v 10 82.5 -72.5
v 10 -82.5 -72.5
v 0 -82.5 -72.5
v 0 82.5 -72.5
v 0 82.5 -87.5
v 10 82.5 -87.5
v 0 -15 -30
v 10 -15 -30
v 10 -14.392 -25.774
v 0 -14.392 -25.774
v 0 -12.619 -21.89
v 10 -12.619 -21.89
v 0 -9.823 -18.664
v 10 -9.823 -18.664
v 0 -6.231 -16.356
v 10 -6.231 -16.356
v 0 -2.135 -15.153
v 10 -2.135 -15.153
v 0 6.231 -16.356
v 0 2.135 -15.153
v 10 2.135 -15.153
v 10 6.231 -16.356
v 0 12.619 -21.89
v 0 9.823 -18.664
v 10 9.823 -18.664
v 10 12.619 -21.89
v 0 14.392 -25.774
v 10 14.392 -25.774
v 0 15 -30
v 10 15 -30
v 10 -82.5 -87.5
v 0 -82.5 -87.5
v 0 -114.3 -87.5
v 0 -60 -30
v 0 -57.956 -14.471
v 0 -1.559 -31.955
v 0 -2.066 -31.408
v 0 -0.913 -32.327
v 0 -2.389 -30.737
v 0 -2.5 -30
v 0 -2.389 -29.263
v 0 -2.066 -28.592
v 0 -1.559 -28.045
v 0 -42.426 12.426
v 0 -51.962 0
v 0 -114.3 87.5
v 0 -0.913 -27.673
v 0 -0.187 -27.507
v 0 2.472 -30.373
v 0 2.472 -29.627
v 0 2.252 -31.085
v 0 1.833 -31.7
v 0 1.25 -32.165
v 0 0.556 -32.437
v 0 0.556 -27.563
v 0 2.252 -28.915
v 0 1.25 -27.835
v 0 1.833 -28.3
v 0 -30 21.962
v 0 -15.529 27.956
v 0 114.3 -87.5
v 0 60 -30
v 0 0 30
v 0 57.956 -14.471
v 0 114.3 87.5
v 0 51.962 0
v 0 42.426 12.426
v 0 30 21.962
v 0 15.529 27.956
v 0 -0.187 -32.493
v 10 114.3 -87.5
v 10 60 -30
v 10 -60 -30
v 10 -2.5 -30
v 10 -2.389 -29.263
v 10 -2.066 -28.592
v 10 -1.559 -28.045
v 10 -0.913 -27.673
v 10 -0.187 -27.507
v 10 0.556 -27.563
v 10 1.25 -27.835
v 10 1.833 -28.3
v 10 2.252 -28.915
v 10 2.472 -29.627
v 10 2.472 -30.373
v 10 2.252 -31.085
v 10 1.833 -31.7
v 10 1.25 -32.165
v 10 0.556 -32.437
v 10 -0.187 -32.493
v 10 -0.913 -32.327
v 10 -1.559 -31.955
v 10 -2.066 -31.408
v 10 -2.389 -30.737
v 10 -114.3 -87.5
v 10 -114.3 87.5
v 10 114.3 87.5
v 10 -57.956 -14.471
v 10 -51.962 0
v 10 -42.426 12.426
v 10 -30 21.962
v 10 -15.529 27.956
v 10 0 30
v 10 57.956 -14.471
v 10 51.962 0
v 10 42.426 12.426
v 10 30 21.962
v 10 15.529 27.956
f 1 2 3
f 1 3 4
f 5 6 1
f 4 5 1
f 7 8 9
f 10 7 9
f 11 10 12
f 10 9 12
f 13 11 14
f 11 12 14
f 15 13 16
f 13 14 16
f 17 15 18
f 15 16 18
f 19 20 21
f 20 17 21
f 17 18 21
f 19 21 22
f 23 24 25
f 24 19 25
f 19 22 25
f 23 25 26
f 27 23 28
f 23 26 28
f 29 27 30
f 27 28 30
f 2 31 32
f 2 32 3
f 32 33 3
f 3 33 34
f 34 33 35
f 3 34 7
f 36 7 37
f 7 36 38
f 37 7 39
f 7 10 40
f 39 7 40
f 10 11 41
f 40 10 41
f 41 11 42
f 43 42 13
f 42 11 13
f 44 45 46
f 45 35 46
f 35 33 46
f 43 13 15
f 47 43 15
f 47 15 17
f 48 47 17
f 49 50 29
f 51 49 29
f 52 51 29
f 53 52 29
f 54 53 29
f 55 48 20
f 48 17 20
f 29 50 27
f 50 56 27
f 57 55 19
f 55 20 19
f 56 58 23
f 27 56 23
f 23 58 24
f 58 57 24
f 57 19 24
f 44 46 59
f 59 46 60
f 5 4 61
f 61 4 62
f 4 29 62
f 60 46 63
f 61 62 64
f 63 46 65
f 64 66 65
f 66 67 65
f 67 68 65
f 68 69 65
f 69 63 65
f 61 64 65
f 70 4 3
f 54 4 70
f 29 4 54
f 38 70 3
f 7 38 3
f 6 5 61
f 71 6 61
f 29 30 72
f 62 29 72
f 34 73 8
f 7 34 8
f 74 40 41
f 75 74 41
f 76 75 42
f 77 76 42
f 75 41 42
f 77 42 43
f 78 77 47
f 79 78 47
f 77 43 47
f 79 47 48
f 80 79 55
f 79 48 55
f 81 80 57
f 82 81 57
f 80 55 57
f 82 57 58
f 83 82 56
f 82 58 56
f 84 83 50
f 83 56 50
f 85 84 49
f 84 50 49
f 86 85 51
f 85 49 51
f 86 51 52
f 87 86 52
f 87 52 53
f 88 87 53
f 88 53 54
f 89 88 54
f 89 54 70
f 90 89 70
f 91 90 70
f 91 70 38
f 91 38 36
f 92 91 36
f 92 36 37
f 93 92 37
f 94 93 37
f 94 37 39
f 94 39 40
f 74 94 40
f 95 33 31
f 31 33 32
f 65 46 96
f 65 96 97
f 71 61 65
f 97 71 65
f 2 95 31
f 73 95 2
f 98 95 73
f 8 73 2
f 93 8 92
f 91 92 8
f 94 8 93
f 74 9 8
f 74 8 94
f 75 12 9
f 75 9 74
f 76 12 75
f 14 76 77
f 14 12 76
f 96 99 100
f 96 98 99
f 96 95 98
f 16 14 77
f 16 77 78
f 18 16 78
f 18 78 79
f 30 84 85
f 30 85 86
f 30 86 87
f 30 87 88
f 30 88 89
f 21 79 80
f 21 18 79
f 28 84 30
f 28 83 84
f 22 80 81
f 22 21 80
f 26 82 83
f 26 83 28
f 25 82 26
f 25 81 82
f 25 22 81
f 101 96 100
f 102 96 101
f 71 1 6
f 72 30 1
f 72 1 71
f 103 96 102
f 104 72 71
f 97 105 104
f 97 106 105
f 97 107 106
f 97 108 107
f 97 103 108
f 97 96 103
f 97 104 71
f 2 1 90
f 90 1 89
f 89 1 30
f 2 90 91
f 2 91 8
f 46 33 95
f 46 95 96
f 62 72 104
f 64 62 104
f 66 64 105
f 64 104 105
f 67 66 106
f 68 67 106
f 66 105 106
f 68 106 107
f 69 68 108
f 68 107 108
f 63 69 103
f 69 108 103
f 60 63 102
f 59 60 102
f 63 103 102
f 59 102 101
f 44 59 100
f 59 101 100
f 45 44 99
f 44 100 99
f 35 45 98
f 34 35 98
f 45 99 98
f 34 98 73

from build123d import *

# Parameters (mm, degrees)
F0_W     = 228.6
F0_H     = 175
F1_DEPTH = 10
F7_DEPTH = 25
F3_W     = 165
F3_H     = 30
F4_DEPTH = 25
F9_D     = 5


with BuildPart() as f1:
    # F0 (on Right) → F1 (new body)
    with BuildSketch(Plane.YZ):
        Rectangle(F0_W, F0_H)
    extrude(amount=F1_DEPTH)

    # F2 (on face) → F7 (cut)
    with BuildSketch(Plane.YZ.offset(10)):
        with BuildLine():
            Line((15, -30), (60, -30))
            ThreePointArc((60, -30), (0, 30), (-60, -30))
            Line((-60, -30), (-15, -30))
            ThreePointArc((-15, -30), (0, -15), (15, -30))
        make_face()
    extrude(amount=-F7_DEPTH, mode=Mode.SUBTRACT)

    # F3 (on face) → F4 (cut)
    with BuildSketch(Plane.YZ.offset(10)):
        with Locations((0, -87.5)):
            Rectangle(F3_W, F3_H)
    extrude(amount=-F4_DEPTH, mode=Mode.SUBTRACT)

    # F9 (through all)
    with Locations(Plane.YZ.offset(10)):
        with Locations((0, -30)):
            Hole(F9_D / 2)


solid = f1.part
